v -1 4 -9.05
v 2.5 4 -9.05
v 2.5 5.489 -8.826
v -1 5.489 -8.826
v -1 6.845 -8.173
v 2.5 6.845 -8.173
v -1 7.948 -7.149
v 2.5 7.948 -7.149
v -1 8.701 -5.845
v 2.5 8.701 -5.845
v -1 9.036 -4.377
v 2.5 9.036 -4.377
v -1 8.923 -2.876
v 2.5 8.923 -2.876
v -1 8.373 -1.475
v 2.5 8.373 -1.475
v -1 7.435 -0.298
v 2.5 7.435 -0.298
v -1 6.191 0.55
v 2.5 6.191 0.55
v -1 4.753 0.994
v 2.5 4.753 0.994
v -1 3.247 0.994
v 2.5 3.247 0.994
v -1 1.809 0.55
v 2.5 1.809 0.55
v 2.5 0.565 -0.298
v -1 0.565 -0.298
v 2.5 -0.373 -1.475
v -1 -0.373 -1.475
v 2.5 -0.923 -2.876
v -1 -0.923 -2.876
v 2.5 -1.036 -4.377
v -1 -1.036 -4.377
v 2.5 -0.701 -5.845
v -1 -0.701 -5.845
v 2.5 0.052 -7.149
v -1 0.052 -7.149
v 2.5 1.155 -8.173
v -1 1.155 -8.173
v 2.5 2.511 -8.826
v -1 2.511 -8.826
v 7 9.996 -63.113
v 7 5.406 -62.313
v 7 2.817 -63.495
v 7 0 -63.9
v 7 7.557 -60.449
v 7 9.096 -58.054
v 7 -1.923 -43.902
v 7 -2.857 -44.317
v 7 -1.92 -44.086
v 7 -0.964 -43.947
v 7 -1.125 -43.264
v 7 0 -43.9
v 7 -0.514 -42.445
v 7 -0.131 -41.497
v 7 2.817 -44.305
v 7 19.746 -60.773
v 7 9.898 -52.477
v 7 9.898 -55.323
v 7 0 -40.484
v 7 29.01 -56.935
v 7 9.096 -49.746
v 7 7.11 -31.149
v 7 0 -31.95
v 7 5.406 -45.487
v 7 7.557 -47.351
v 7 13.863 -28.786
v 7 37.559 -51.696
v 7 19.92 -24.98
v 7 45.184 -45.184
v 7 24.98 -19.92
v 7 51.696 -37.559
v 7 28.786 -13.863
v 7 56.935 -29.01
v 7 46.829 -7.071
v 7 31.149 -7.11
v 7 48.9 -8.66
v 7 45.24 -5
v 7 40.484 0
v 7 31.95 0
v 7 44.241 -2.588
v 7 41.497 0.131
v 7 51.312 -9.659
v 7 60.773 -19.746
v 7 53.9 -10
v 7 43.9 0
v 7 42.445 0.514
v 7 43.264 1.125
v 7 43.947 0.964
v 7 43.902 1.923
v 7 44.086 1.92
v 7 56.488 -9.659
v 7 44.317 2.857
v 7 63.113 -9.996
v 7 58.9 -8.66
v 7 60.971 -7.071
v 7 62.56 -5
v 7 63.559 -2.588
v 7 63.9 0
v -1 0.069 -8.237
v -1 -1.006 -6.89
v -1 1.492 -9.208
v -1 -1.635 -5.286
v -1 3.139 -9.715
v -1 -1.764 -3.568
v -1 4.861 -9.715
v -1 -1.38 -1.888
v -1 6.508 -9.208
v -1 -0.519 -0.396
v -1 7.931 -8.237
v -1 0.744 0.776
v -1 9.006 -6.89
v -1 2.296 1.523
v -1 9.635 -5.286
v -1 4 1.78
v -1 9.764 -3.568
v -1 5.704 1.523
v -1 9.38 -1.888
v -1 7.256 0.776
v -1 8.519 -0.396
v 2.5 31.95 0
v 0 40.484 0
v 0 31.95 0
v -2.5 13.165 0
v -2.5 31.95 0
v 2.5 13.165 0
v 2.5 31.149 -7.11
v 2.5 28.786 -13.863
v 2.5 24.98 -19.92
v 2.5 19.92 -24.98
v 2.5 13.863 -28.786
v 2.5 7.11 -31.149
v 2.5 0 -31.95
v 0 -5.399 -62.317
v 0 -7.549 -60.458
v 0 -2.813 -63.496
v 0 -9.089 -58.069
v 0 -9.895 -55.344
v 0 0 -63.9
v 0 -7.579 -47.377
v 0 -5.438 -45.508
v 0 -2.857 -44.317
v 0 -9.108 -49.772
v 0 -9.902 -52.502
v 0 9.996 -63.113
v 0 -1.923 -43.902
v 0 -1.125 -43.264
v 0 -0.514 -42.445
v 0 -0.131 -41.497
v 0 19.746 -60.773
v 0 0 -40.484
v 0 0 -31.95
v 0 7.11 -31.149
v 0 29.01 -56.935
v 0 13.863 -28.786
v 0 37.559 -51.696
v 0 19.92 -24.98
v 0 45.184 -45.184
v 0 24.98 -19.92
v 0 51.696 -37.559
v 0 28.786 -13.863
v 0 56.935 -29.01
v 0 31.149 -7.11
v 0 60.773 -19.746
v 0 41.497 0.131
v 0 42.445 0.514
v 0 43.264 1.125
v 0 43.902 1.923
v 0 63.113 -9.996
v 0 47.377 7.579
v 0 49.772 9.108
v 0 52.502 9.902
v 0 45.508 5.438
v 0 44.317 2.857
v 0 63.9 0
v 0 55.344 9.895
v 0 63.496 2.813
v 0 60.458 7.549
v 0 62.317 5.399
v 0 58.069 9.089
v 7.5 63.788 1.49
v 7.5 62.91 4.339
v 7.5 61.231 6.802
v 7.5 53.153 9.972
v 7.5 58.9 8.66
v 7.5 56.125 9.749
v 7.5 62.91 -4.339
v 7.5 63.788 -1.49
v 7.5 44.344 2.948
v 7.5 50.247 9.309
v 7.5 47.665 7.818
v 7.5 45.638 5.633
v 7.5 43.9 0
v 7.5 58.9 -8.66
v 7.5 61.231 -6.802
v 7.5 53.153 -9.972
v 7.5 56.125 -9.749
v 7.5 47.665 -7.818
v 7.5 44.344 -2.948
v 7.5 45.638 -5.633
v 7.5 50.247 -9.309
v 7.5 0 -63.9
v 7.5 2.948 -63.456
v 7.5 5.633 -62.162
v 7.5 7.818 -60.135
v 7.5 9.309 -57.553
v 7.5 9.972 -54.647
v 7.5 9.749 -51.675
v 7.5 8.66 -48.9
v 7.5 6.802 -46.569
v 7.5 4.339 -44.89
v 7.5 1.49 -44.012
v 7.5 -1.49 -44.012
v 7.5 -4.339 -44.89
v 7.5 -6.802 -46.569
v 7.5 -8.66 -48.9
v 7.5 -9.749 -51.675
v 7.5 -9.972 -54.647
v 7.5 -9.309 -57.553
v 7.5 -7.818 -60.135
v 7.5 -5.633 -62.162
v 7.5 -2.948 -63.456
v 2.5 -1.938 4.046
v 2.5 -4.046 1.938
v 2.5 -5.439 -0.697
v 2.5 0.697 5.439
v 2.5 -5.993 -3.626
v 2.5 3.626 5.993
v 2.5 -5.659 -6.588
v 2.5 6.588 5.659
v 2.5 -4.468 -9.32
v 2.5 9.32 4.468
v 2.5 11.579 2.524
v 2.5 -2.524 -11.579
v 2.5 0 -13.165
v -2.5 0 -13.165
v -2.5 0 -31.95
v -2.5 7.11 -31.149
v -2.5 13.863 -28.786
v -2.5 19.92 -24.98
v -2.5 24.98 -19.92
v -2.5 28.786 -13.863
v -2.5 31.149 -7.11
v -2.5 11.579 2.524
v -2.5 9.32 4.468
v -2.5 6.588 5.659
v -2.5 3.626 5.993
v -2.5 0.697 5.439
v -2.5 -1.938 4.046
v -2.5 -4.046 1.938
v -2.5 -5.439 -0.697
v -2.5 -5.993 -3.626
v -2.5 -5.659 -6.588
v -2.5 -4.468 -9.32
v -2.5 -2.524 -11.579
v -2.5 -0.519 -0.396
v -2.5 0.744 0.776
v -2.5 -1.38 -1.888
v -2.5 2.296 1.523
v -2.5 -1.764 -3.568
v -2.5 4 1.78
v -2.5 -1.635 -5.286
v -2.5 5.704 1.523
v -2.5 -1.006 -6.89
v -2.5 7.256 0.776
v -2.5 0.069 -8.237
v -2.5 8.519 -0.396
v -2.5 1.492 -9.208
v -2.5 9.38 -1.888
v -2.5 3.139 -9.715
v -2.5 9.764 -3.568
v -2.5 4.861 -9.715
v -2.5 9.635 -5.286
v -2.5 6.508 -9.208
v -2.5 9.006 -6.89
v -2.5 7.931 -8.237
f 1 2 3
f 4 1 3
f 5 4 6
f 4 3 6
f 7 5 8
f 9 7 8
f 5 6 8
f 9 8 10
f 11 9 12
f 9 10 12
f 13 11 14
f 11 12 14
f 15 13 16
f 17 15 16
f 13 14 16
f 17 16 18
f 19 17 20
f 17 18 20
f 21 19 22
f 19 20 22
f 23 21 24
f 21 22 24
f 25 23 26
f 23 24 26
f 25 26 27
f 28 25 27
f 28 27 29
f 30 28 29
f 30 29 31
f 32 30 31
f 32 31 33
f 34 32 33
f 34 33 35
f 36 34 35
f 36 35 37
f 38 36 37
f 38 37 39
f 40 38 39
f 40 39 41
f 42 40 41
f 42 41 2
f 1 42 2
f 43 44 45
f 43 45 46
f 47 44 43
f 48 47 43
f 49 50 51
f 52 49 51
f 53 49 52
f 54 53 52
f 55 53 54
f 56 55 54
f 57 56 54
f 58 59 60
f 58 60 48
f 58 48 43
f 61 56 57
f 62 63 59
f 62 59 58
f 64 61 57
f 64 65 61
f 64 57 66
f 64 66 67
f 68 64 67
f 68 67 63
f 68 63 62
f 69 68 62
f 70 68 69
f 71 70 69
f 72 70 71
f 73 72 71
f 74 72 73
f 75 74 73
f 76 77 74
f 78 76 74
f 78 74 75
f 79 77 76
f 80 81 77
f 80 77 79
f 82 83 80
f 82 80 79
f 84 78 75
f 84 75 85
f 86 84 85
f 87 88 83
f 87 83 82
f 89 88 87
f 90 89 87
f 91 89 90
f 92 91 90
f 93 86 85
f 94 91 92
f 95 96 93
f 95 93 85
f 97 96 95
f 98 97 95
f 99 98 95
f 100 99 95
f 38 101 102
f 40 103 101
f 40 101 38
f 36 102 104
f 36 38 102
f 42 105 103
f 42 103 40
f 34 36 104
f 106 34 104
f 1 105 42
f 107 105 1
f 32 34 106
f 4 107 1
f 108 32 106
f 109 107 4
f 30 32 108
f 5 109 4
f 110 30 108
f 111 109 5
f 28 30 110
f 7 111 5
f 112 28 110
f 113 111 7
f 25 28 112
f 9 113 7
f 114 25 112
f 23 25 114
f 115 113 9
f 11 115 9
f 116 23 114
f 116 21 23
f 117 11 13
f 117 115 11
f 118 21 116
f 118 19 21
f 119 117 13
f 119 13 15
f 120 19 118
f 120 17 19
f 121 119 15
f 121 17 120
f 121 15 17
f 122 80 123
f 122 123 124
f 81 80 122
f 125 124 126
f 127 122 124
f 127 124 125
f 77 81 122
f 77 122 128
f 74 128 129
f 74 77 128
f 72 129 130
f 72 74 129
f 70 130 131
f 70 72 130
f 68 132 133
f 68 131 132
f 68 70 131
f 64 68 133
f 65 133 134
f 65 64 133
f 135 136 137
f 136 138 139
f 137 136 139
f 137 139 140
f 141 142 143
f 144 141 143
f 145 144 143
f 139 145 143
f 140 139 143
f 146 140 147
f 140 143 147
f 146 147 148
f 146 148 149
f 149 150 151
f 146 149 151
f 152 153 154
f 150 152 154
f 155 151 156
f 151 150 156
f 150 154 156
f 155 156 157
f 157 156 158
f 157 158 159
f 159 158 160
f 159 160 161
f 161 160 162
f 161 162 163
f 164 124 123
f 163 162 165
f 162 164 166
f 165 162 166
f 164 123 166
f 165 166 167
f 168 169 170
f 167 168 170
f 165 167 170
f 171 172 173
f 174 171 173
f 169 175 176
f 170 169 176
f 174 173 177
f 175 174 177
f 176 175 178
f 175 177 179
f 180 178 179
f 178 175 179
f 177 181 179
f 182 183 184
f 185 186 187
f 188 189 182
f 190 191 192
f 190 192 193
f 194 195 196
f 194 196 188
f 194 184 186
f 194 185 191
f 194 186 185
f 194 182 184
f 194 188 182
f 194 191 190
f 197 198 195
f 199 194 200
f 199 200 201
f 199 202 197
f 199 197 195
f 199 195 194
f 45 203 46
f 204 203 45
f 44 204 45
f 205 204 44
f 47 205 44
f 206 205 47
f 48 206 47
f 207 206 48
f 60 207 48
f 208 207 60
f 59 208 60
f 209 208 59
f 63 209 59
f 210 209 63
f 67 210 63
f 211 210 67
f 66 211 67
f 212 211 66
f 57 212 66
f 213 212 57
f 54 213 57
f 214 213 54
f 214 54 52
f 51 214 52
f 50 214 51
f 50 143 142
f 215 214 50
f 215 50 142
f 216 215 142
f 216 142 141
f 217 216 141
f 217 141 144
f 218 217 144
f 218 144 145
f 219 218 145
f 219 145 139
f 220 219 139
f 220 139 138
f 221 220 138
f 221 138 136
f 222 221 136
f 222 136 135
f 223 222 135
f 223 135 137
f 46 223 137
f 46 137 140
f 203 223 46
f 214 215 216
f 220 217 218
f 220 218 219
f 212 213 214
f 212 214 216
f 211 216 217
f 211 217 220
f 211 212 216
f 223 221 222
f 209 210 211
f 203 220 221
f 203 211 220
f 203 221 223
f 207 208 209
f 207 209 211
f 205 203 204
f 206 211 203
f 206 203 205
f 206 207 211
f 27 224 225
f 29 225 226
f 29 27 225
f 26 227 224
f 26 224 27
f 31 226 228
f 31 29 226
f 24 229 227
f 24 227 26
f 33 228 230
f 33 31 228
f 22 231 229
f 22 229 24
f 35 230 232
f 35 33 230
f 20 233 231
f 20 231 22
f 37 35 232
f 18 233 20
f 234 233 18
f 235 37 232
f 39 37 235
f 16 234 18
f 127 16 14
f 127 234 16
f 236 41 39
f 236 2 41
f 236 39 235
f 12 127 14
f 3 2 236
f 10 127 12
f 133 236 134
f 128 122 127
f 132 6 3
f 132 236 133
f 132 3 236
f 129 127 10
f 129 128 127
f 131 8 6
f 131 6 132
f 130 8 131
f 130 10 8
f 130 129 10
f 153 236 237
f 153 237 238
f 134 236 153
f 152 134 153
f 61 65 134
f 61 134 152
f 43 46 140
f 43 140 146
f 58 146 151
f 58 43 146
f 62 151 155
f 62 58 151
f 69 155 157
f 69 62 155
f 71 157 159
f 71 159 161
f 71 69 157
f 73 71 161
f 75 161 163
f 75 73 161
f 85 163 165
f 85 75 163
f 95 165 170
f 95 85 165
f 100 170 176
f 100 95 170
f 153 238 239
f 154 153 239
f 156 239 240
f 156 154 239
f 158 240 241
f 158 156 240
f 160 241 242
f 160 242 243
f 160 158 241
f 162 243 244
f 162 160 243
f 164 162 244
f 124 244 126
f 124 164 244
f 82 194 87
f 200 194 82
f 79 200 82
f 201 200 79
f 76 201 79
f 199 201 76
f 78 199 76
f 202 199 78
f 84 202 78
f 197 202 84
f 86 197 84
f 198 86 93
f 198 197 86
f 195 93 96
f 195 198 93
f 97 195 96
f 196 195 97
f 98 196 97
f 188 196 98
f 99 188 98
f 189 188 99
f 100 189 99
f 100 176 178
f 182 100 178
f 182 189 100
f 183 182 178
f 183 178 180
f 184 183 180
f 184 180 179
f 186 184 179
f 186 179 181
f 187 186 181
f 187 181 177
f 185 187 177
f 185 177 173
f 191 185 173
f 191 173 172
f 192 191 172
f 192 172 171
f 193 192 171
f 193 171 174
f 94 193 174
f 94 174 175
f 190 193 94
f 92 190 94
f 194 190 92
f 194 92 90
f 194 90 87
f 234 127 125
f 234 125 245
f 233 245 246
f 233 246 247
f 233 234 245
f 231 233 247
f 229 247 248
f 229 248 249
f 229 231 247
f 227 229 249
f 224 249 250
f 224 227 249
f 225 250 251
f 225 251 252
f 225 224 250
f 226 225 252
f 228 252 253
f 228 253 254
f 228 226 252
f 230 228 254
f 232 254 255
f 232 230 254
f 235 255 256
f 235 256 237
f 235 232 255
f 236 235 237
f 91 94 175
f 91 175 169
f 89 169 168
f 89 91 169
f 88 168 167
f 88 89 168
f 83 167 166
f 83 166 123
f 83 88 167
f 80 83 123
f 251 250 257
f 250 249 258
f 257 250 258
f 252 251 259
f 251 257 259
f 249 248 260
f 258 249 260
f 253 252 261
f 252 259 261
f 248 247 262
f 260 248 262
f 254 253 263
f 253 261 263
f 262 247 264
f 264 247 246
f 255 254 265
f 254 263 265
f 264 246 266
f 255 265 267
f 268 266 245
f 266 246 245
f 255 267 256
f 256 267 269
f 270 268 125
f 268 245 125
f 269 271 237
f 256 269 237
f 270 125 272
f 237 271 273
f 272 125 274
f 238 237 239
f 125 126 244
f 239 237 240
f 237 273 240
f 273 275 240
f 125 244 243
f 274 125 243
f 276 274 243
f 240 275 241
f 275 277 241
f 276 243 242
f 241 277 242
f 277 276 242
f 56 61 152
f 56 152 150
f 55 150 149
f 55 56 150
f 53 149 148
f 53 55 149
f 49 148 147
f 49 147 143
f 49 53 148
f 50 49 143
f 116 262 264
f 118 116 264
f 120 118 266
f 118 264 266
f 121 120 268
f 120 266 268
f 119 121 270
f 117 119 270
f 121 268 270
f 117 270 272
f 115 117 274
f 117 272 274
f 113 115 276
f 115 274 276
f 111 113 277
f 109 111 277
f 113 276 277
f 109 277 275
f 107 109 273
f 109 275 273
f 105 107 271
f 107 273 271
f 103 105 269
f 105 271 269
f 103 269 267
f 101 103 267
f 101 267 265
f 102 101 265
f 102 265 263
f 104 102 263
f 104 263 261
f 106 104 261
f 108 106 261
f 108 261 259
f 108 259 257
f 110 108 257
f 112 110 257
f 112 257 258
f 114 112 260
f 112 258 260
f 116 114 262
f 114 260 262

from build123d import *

# Parameters (mm, degrees)
SALIENTE_EXTRUIR1_DEPTH = 2.5
SALIENTE_EXTRUIR2_START = 7
SALIENTE_EXTRUIR2_DEPTH = 7
SALIENTE_EXTRUIR3_START = 7.5
CROQUIS2_4_R            = 10
SALIENTE_EXTRUIR3_DEPTH = 7.5
REDONDEO1_R             = 4
REDONDEO2_R             = 4
CROQUIS3_R              = 10
SALIENTE_EXTRUIR4_DEPTH = 5
CROQUIS4_R              = 5.05
CORTAR_EXTRUIR1_DEPTH   = 131
CROQUIS5_R              = 5.78
CORTAR_EXTRUIR2_DEPTH   = 1.5


with BuildPart() as part:
    # Croquis2 → Saliente-Extruir1 (new, symmetric)
    with BuildSketch(Plane(origin=(0, 0, 0), x_dir=(0, 0, -1), z_dir=(1, 0, 0))):
        with BuildLine():
            ThreePointArc((31.95, 0), (22.592061659, 22.592061659), (0, 31.95))
            Line((0, 31.95), (0, 0))
            Line((0, 0), (31.95, 0))
        make_face()
    extrude(amount=SALIENTE_EXTRUIR1_DEPTH, both=True)

    # Croquis2<3> → Saliente-Extruir2 (add)
    with BuildSketch(Plane(origin=(0, 0, 0), x_dir=(0, 0, -1), z_dir=(1, 0, 0)).offset(SALIENTE_EXTRUIR2_START)):
        with BuildLine():
            ThreePointArc((10, 53.9), (7.071067812, 46.828932188), (0, 43.9))
            Line((0, 43.9), (0, 31.95))
            ThreePointArc((0, 31.95), (22.592061659, 22.592061659), (31.95, 0))
            Line((31.95, 0), (43.9, 0))
            ThreePointArc((43.9, 0), (53.9, 10), (63.9, 0))
            ThreePointArc((63.9, 0), (45.184123318, 45.184123318), (0, 63.9))
            ThreePointArc((0, 63.9), (7.071067812, 60.971067812), (10, 53.9))
        make_face()
    extrude(amount=-SALIENTE_EXTRUIR2_DEPTH)

    # Croquis2<4> → Saliente-Extruir3 (add)
    with BuildSketch(Plane(origin=(0, 0, 0), x_dir=(0, 0, -1), z_dir=(1, 0, 0)).offset(SALIENTE_EXTRUIR3_START)):
        with Locations(Location((0, 53.9, 0), (0, 0, 270))):
            Circle(CROQUIS2_4_R)
        with Locations((53.9, 0)):
            Circle(CROQUIS2_4_R)
    extrude(amount=-SALIENTE_EXTRUIR3_DEPTH)

    # Redondeo1
    redondeo1_edges = [part.edges().sort_by_distance(p)[0] for p in [
        (0, 0, 0),
    ]]
    fillet(redondeo1_edges, radius=REDONDEO1_R)

    # Redondeo2
    # the kernel refuses this fillet: 4 mm, written as the material it adds along each edge
    with BuildSketch(Plane(origin=(7, 0, -43.9), x_dir=(0, 0, 1), z_dir=(-1, 0, 0))) as redondeo2_piece_1:
        with BuildLine():
            CenterArc((3.416407865, -4), REDONDEO2_R, 90, 73.398450401)
            ThreePointArc((-0.416851525, -2.857142857), (-0.104761631, -1.443695821), (0, 0))
            Line((0, 0), (3.416407865, 0))
        make_face()
    extrude(amount=7)
    with BuildSketch(Plane(origin=(7, 43.9, 0), x_dir=(0, -1, 0), z_dir=(-1, 0, 0))) as redondeo2_piece_2:
        with BuildLine():
            CenterArc((3.416407865, 4), REDONDEO2_R, 196.601549599, 73.398450401)
            ThreePointArc((-0.416851525, 2.857142857), (-0.104761631, 1.443695821), (0, 0))
            Line((0, 0), (3.416407865, 0))
        make_face()
    extrude(amount=7)

    # Croquis3 → Saliente-Extruir4 (add)
    with BuildSketch(Plane(origin=(2.5, 0, 0), x_dir=(0, 0, -1), z_dir=(1, 0, 0))):
        with Locations((4, 4)):
            Circle(CROQUIS3_R)
    extrude(amount=-SALIENTE_EXTRUIR4_DEPTH)

    # Croquis4 → Cortar-Extruir1 (cut)
    with BuildSketch(Plane(origin=(2.5, 0, 0), x_dir=(0, 0, -1), z_dir=(1, 0, 0))):
        with Locations((4, 4)):
            Circle(CROQUIS4_R)
    extrude(amount=-CORTAR_EXTRUIR1_DEPTH, mode=Mode.SUBTRACT)

    # Croquis5 → Cortar-Extruir2 (cut)
    with BuildSketch(Plane.ZY.offset(2.5)):
        with Locations((-4, 4)):
            Circle(CROQUIS5_R)
    extrude(amount=-CORTAR_EXTRUIR2_DEPTH, mode=Mode.SUBTRACT)


solid = part.part
